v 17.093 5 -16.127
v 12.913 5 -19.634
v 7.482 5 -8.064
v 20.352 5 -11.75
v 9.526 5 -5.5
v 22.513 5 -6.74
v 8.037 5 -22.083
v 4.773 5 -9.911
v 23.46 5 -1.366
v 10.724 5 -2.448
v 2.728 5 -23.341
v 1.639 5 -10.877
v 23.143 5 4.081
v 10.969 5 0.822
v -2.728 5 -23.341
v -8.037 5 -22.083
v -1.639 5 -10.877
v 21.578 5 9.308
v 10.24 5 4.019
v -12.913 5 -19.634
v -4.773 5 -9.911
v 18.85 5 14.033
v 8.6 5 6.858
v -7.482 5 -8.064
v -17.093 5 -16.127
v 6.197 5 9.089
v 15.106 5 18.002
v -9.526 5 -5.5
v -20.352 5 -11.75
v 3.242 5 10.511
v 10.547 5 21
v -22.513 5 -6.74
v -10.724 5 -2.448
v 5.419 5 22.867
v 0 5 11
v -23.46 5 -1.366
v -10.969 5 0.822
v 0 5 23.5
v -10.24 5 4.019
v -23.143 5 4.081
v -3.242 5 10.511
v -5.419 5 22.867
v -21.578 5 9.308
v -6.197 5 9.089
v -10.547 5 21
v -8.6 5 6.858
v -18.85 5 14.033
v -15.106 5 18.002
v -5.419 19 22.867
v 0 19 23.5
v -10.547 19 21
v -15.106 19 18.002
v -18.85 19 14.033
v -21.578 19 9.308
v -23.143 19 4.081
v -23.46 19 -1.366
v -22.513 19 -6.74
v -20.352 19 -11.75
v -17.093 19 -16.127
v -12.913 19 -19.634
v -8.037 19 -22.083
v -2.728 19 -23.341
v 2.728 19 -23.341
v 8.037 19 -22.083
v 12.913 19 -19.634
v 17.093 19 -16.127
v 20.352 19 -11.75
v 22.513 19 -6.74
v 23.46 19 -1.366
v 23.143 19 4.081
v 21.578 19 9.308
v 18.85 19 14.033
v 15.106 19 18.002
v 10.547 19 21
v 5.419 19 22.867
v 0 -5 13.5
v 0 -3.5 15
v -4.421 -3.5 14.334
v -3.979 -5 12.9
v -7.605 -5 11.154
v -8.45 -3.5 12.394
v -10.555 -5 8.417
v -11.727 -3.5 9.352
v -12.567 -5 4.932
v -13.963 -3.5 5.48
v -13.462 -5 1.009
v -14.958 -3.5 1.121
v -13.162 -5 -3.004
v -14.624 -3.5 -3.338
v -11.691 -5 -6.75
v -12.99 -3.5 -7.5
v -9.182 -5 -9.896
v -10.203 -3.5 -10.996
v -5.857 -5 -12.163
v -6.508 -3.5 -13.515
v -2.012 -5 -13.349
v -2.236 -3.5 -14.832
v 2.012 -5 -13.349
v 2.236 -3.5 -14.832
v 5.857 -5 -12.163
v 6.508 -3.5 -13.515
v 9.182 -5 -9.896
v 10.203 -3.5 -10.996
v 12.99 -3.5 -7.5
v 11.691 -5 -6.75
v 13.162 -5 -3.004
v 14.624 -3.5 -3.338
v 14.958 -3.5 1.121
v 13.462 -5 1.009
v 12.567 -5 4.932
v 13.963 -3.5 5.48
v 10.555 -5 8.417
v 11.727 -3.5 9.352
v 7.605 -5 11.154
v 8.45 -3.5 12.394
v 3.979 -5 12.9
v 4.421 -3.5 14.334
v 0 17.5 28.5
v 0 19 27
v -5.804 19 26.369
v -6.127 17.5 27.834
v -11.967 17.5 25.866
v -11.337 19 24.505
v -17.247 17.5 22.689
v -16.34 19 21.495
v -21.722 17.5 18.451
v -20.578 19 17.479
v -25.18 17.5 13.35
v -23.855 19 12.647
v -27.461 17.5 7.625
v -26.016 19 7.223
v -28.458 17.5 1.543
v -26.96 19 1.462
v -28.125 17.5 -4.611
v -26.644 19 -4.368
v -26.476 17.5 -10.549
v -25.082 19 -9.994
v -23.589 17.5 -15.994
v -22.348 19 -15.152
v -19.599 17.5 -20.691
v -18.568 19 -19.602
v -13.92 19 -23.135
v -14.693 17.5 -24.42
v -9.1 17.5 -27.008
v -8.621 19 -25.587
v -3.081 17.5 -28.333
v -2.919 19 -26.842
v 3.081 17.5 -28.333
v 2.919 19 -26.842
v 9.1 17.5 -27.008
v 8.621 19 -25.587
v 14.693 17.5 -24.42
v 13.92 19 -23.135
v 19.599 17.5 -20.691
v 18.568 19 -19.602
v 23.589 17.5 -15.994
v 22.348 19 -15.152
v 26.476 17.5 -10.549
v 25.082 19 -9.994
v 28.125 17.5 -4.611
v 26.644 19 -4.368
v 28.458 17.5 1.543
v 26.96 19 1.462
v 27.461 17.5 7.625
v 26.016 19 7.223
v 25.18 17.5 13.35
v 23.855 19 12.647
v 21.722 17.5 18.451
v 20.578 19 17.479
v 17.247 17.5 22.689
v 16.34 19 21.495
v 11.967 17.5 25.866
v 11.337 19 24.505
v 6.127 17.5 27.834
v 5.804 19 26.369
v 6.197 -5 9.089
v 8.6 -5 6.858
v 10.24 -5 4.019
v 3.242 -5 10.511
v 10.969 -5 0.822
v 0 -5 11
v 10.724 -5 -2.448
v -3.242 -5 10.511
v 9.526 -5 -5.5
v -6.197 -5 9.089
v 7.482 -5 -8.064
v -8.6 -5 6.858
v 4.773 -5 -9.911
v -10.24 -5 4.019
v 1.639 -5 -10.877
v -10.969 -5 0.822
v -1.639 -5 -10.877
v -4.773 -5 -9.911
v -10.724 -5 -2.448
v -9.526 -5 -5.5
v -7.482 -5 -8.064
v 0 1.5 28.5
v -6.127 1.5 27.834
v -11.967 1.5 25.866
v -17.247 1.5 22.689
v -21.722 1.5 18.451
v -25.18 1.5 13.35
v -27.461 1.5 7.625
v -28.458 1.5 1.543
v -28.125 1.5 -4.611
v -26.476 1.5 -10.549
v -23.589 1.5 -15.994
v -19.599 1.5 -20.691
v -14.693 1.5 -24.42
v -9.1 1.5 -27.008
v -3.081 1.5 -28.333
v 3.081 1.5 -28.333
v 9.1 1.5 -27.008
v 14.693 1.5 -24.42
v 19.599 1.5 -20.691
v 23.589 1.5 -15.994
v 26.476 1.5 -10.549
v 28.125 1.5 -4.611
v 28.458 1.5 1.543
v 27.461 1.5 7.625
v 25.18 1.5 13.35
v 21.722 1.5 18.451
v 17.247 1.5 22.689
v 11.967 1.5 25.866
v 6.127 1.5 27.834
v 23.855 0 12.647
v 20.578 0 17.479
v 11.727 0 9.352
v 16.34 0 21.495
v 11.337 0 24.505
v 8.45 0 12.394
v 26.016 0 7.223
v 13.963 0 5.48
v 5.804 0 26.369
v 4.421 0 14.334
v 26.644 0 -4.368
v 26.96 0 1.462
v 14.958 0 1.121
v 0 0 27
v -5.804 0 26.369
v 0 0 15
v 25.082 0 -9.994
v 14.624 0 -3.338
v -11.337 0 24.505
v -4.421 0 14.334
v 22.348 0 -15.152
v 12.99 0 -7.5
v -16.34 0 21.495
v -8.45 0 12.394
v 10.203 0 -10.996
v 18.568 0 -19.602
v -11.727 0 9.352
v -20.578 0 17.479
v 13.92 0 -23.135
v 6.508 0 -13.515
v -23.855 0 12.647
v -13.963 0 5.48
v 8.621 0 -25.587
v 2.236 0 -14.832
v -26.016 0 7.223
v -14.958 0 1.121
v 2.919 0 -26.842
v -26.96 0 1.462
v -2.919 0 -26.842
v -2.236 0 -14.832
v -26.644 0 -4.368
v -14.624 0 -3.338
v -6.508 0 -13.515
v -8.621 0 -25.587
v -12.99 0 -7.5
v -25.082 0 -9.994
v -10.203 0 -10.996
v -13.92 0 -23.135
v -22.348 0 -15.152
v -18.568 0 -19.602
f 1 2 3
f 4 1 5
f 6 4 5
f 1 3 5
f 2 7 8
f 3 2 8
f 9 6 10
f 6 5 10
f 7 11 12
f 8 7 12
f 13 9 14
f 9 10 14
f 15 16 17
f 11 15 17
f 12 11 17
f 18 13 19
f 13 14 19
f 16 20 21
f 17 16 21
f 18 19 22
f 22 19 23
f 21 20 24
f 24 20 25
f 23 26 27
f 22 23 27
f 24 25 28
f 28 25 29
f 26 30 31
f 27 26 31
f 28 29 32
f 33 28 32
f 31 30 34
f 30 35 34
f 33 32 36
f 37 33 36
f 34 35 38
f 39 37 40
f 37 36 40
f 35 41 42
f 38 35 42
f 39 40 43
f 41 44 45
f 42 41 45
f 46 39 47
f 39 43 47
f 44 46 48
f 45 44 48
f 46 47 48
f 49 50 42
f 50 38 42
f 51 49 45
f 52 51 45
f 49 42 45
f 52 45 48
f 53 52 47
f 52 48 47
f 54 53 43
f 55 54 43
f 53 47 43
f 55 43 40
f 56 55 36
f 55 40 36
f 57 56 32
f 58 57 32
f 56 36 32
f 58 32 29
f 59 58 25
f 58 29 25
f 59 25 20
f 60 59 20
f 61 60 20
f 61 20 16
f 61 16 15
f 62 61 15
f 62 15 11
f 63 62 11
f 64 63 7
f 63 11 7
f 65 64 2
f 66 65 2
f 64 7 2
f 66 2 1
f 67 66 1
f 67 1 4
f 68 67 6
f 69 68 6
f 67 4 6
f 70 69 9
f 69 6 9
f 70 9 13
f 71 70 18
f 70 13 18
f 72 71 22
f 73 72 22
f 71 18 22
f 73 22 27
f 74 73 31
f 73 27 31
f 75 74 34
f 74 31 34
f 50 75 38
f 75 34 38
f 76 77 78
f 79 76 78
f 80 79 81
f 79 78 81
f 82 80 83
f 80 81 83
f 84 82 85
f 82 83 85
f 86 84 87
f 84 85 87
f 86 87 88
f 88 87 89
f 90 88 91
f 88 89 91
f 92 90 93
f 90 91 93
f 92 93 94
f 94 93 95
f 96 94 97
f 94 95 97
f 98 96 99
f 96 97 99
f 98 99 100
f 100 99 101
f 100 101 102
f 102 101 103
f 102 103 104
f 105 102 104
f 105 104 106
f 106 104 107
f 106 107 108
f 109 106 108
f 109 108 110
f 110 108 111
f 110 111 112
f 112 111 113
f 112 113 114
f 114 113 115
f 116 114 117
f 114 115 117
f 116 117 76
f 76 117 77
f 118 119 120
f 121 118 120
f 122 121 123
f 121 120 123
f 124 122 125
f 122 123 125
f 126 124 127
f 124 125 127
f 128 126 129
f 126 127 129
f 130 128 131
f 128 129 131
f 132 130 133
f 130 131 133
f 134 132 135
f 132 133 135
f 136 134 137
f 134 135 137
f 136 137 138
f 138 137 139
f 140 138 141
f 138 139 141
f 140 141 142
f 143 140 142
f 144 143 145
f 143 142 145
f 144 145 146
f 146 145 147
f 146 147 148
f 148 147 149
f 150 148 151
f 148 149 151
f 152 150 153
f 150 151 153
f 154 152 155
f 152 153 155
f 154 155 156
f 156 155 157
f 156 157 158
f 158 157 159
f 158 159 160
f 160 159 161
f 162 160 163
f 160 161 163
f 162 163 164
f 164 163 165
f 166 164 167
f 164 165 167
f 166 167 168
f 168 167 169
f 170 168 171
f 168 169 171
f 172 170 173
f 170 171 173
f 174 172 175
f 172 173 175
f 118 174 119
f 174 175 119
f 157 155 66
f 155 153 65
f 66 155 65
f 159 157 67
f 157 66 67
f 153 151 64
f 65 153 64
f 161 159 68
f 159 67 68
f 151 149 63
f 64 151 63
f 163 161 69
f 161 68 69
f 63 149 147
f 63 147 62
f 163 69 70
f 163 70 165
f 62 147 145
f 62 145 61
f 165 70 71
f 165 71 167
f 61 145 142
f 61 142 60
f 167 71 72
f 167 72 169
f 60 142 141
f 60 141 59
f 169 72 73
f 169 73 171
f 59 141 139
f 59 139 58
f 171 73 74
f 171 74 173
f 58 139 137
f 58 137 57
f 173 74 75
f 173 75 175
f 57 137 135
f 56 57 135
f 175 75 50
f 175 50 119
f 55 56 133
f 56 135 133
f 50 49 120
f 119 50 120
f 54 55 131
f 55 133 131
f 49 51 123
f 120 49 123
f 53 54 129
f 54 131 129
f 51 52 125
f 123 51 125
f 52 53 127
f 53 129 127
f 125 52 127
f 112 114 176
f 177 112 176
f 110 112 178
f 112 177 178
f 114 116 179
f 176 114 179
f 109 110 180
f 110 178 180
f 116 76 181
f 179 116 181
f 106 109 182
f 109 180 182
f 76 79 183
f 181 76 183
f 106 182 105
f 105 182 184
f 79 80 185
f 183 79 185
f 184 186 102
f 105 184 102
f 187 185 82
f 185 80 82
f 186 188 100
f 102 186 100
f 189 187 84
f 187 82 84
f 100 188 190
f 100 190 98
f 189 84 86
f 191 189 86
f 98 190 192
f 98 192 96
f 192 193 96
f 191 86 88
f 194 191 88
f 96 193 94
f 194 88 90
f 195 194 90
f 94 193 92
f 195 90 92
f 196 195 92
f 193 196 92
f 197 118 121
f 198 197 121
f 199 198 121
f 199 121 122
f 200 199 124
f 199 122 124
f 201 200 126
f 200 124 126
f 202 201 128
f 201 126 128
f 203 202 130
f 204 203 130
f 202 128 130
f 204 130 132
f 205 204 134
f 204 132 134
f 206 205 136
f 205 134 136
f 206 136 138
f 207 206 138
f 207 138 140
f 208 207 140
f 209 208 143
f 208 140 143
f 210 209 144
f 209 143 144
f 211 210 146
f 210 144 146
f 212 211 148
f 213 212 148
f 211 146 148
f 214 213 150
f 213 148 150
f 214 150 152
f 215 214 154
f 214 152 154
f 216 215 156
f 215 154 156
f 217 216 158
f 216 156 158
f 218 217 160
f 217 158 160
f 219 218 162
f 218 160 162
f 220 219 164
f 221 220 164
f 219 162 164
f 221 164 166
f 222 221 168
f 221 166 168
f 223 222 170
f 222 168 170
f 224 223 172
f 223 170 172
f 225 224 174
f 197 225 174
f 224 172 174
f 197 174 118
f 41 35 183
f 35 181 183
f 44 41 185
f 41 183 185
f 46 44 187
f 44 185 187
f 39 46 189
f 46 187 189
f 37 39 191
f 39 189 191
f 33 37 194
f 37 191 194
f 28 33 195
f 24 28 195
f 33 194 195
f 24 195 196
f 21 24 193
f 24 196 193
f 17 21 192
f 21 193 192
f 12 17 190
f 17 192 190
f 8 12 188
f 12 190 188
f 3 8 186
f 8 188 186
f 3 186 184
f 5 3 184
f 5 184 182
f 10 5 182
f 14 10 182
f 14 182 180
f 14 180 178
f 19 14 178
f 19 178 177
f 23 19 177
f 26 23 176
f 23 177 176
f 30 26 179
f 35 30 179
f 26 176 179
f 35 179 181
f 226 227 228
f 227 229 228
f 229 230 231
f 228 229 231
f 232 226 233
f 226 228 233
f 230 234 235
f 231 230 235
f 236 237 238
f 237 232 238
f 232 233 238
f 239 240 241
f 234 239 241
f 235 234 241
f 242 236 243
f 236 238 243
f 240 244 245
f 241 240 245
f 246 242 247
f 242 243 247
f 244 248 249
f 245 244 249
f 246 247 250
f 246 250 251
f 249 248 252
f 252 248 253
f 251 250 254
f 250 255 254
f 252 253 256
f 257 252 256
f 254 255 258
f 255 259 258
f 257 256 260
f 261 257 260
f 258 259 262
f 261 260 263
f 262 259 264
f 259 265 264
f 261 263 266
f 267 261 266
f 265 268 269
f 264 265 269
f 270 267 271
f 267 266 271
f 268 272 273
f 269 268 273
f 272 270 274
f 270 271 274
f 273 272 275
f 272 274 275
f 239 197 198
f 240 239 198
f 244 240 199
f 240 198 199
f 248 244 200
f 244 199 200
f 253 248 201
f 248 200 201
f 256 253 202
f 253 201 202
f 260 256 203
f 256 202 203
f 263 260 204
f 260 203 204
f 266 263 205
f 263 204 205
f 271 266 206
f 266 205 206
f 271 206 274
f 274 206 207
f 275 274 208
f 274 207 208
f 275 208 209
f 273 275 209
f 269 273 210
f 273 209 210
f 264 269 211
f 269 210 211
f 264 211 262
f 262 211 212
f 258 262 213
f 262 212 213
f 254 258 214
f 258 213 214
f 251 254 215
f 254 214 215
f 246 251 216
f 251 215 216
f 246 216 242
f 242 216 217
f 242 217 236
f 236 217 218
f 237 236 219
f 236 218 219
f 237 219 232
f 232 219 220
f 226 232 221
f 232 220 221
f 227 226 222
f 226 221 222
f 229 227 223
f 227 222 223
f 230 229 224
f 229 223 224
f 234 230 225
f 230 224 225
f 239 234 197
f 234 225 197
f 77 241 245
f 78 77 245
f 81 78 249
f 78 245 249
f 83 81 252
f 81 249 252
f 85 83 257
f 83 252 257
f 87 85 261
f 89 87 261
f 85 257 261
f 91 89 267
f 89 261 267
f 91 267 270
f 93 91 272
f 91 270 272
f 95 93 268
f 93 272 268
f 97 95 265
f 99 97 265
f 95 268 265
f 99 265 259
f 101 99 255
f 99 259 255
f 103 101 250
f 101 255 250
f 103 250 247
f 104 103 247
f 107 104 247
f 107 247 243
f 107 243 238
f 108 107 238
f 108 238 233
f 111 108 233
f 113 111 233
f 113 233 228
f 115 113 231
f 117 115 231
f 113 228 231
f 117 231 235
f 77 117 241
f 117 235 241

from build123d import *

# Parameters (mm, degrees)
CHAMFER_1_SIZE = 1.5


with BuildPart() as part:
    # Эскиз1 → Повернуть1 (revolve)
    with BuildSketch(Plane(origin=(0, 0, 0), x_dir=(0, 0, -1), z_dir=(1, 0, 0))):
        Polygon((-15, 0), (-28.5, 0), (-28.5, 19), (-23.5, 19), (-23.5, 5), (-11, 5), (-11, -5), (-15, -5), align=None)
    revolve(axis=Axis((0, 19.771159875, 0), (0, -1, 0)))

    # Фаска1
    chamfer_1_edges = [part.edges().sort_by_distance(p)[0] for p in [
        (0, 19, -28.5),
        (0, 0, -28.5),
        (0, -5, -15),
    ]]
    chamfer(chamfer_1_edges, length=CHAMFER_1_SIZE)


solid = part.part
